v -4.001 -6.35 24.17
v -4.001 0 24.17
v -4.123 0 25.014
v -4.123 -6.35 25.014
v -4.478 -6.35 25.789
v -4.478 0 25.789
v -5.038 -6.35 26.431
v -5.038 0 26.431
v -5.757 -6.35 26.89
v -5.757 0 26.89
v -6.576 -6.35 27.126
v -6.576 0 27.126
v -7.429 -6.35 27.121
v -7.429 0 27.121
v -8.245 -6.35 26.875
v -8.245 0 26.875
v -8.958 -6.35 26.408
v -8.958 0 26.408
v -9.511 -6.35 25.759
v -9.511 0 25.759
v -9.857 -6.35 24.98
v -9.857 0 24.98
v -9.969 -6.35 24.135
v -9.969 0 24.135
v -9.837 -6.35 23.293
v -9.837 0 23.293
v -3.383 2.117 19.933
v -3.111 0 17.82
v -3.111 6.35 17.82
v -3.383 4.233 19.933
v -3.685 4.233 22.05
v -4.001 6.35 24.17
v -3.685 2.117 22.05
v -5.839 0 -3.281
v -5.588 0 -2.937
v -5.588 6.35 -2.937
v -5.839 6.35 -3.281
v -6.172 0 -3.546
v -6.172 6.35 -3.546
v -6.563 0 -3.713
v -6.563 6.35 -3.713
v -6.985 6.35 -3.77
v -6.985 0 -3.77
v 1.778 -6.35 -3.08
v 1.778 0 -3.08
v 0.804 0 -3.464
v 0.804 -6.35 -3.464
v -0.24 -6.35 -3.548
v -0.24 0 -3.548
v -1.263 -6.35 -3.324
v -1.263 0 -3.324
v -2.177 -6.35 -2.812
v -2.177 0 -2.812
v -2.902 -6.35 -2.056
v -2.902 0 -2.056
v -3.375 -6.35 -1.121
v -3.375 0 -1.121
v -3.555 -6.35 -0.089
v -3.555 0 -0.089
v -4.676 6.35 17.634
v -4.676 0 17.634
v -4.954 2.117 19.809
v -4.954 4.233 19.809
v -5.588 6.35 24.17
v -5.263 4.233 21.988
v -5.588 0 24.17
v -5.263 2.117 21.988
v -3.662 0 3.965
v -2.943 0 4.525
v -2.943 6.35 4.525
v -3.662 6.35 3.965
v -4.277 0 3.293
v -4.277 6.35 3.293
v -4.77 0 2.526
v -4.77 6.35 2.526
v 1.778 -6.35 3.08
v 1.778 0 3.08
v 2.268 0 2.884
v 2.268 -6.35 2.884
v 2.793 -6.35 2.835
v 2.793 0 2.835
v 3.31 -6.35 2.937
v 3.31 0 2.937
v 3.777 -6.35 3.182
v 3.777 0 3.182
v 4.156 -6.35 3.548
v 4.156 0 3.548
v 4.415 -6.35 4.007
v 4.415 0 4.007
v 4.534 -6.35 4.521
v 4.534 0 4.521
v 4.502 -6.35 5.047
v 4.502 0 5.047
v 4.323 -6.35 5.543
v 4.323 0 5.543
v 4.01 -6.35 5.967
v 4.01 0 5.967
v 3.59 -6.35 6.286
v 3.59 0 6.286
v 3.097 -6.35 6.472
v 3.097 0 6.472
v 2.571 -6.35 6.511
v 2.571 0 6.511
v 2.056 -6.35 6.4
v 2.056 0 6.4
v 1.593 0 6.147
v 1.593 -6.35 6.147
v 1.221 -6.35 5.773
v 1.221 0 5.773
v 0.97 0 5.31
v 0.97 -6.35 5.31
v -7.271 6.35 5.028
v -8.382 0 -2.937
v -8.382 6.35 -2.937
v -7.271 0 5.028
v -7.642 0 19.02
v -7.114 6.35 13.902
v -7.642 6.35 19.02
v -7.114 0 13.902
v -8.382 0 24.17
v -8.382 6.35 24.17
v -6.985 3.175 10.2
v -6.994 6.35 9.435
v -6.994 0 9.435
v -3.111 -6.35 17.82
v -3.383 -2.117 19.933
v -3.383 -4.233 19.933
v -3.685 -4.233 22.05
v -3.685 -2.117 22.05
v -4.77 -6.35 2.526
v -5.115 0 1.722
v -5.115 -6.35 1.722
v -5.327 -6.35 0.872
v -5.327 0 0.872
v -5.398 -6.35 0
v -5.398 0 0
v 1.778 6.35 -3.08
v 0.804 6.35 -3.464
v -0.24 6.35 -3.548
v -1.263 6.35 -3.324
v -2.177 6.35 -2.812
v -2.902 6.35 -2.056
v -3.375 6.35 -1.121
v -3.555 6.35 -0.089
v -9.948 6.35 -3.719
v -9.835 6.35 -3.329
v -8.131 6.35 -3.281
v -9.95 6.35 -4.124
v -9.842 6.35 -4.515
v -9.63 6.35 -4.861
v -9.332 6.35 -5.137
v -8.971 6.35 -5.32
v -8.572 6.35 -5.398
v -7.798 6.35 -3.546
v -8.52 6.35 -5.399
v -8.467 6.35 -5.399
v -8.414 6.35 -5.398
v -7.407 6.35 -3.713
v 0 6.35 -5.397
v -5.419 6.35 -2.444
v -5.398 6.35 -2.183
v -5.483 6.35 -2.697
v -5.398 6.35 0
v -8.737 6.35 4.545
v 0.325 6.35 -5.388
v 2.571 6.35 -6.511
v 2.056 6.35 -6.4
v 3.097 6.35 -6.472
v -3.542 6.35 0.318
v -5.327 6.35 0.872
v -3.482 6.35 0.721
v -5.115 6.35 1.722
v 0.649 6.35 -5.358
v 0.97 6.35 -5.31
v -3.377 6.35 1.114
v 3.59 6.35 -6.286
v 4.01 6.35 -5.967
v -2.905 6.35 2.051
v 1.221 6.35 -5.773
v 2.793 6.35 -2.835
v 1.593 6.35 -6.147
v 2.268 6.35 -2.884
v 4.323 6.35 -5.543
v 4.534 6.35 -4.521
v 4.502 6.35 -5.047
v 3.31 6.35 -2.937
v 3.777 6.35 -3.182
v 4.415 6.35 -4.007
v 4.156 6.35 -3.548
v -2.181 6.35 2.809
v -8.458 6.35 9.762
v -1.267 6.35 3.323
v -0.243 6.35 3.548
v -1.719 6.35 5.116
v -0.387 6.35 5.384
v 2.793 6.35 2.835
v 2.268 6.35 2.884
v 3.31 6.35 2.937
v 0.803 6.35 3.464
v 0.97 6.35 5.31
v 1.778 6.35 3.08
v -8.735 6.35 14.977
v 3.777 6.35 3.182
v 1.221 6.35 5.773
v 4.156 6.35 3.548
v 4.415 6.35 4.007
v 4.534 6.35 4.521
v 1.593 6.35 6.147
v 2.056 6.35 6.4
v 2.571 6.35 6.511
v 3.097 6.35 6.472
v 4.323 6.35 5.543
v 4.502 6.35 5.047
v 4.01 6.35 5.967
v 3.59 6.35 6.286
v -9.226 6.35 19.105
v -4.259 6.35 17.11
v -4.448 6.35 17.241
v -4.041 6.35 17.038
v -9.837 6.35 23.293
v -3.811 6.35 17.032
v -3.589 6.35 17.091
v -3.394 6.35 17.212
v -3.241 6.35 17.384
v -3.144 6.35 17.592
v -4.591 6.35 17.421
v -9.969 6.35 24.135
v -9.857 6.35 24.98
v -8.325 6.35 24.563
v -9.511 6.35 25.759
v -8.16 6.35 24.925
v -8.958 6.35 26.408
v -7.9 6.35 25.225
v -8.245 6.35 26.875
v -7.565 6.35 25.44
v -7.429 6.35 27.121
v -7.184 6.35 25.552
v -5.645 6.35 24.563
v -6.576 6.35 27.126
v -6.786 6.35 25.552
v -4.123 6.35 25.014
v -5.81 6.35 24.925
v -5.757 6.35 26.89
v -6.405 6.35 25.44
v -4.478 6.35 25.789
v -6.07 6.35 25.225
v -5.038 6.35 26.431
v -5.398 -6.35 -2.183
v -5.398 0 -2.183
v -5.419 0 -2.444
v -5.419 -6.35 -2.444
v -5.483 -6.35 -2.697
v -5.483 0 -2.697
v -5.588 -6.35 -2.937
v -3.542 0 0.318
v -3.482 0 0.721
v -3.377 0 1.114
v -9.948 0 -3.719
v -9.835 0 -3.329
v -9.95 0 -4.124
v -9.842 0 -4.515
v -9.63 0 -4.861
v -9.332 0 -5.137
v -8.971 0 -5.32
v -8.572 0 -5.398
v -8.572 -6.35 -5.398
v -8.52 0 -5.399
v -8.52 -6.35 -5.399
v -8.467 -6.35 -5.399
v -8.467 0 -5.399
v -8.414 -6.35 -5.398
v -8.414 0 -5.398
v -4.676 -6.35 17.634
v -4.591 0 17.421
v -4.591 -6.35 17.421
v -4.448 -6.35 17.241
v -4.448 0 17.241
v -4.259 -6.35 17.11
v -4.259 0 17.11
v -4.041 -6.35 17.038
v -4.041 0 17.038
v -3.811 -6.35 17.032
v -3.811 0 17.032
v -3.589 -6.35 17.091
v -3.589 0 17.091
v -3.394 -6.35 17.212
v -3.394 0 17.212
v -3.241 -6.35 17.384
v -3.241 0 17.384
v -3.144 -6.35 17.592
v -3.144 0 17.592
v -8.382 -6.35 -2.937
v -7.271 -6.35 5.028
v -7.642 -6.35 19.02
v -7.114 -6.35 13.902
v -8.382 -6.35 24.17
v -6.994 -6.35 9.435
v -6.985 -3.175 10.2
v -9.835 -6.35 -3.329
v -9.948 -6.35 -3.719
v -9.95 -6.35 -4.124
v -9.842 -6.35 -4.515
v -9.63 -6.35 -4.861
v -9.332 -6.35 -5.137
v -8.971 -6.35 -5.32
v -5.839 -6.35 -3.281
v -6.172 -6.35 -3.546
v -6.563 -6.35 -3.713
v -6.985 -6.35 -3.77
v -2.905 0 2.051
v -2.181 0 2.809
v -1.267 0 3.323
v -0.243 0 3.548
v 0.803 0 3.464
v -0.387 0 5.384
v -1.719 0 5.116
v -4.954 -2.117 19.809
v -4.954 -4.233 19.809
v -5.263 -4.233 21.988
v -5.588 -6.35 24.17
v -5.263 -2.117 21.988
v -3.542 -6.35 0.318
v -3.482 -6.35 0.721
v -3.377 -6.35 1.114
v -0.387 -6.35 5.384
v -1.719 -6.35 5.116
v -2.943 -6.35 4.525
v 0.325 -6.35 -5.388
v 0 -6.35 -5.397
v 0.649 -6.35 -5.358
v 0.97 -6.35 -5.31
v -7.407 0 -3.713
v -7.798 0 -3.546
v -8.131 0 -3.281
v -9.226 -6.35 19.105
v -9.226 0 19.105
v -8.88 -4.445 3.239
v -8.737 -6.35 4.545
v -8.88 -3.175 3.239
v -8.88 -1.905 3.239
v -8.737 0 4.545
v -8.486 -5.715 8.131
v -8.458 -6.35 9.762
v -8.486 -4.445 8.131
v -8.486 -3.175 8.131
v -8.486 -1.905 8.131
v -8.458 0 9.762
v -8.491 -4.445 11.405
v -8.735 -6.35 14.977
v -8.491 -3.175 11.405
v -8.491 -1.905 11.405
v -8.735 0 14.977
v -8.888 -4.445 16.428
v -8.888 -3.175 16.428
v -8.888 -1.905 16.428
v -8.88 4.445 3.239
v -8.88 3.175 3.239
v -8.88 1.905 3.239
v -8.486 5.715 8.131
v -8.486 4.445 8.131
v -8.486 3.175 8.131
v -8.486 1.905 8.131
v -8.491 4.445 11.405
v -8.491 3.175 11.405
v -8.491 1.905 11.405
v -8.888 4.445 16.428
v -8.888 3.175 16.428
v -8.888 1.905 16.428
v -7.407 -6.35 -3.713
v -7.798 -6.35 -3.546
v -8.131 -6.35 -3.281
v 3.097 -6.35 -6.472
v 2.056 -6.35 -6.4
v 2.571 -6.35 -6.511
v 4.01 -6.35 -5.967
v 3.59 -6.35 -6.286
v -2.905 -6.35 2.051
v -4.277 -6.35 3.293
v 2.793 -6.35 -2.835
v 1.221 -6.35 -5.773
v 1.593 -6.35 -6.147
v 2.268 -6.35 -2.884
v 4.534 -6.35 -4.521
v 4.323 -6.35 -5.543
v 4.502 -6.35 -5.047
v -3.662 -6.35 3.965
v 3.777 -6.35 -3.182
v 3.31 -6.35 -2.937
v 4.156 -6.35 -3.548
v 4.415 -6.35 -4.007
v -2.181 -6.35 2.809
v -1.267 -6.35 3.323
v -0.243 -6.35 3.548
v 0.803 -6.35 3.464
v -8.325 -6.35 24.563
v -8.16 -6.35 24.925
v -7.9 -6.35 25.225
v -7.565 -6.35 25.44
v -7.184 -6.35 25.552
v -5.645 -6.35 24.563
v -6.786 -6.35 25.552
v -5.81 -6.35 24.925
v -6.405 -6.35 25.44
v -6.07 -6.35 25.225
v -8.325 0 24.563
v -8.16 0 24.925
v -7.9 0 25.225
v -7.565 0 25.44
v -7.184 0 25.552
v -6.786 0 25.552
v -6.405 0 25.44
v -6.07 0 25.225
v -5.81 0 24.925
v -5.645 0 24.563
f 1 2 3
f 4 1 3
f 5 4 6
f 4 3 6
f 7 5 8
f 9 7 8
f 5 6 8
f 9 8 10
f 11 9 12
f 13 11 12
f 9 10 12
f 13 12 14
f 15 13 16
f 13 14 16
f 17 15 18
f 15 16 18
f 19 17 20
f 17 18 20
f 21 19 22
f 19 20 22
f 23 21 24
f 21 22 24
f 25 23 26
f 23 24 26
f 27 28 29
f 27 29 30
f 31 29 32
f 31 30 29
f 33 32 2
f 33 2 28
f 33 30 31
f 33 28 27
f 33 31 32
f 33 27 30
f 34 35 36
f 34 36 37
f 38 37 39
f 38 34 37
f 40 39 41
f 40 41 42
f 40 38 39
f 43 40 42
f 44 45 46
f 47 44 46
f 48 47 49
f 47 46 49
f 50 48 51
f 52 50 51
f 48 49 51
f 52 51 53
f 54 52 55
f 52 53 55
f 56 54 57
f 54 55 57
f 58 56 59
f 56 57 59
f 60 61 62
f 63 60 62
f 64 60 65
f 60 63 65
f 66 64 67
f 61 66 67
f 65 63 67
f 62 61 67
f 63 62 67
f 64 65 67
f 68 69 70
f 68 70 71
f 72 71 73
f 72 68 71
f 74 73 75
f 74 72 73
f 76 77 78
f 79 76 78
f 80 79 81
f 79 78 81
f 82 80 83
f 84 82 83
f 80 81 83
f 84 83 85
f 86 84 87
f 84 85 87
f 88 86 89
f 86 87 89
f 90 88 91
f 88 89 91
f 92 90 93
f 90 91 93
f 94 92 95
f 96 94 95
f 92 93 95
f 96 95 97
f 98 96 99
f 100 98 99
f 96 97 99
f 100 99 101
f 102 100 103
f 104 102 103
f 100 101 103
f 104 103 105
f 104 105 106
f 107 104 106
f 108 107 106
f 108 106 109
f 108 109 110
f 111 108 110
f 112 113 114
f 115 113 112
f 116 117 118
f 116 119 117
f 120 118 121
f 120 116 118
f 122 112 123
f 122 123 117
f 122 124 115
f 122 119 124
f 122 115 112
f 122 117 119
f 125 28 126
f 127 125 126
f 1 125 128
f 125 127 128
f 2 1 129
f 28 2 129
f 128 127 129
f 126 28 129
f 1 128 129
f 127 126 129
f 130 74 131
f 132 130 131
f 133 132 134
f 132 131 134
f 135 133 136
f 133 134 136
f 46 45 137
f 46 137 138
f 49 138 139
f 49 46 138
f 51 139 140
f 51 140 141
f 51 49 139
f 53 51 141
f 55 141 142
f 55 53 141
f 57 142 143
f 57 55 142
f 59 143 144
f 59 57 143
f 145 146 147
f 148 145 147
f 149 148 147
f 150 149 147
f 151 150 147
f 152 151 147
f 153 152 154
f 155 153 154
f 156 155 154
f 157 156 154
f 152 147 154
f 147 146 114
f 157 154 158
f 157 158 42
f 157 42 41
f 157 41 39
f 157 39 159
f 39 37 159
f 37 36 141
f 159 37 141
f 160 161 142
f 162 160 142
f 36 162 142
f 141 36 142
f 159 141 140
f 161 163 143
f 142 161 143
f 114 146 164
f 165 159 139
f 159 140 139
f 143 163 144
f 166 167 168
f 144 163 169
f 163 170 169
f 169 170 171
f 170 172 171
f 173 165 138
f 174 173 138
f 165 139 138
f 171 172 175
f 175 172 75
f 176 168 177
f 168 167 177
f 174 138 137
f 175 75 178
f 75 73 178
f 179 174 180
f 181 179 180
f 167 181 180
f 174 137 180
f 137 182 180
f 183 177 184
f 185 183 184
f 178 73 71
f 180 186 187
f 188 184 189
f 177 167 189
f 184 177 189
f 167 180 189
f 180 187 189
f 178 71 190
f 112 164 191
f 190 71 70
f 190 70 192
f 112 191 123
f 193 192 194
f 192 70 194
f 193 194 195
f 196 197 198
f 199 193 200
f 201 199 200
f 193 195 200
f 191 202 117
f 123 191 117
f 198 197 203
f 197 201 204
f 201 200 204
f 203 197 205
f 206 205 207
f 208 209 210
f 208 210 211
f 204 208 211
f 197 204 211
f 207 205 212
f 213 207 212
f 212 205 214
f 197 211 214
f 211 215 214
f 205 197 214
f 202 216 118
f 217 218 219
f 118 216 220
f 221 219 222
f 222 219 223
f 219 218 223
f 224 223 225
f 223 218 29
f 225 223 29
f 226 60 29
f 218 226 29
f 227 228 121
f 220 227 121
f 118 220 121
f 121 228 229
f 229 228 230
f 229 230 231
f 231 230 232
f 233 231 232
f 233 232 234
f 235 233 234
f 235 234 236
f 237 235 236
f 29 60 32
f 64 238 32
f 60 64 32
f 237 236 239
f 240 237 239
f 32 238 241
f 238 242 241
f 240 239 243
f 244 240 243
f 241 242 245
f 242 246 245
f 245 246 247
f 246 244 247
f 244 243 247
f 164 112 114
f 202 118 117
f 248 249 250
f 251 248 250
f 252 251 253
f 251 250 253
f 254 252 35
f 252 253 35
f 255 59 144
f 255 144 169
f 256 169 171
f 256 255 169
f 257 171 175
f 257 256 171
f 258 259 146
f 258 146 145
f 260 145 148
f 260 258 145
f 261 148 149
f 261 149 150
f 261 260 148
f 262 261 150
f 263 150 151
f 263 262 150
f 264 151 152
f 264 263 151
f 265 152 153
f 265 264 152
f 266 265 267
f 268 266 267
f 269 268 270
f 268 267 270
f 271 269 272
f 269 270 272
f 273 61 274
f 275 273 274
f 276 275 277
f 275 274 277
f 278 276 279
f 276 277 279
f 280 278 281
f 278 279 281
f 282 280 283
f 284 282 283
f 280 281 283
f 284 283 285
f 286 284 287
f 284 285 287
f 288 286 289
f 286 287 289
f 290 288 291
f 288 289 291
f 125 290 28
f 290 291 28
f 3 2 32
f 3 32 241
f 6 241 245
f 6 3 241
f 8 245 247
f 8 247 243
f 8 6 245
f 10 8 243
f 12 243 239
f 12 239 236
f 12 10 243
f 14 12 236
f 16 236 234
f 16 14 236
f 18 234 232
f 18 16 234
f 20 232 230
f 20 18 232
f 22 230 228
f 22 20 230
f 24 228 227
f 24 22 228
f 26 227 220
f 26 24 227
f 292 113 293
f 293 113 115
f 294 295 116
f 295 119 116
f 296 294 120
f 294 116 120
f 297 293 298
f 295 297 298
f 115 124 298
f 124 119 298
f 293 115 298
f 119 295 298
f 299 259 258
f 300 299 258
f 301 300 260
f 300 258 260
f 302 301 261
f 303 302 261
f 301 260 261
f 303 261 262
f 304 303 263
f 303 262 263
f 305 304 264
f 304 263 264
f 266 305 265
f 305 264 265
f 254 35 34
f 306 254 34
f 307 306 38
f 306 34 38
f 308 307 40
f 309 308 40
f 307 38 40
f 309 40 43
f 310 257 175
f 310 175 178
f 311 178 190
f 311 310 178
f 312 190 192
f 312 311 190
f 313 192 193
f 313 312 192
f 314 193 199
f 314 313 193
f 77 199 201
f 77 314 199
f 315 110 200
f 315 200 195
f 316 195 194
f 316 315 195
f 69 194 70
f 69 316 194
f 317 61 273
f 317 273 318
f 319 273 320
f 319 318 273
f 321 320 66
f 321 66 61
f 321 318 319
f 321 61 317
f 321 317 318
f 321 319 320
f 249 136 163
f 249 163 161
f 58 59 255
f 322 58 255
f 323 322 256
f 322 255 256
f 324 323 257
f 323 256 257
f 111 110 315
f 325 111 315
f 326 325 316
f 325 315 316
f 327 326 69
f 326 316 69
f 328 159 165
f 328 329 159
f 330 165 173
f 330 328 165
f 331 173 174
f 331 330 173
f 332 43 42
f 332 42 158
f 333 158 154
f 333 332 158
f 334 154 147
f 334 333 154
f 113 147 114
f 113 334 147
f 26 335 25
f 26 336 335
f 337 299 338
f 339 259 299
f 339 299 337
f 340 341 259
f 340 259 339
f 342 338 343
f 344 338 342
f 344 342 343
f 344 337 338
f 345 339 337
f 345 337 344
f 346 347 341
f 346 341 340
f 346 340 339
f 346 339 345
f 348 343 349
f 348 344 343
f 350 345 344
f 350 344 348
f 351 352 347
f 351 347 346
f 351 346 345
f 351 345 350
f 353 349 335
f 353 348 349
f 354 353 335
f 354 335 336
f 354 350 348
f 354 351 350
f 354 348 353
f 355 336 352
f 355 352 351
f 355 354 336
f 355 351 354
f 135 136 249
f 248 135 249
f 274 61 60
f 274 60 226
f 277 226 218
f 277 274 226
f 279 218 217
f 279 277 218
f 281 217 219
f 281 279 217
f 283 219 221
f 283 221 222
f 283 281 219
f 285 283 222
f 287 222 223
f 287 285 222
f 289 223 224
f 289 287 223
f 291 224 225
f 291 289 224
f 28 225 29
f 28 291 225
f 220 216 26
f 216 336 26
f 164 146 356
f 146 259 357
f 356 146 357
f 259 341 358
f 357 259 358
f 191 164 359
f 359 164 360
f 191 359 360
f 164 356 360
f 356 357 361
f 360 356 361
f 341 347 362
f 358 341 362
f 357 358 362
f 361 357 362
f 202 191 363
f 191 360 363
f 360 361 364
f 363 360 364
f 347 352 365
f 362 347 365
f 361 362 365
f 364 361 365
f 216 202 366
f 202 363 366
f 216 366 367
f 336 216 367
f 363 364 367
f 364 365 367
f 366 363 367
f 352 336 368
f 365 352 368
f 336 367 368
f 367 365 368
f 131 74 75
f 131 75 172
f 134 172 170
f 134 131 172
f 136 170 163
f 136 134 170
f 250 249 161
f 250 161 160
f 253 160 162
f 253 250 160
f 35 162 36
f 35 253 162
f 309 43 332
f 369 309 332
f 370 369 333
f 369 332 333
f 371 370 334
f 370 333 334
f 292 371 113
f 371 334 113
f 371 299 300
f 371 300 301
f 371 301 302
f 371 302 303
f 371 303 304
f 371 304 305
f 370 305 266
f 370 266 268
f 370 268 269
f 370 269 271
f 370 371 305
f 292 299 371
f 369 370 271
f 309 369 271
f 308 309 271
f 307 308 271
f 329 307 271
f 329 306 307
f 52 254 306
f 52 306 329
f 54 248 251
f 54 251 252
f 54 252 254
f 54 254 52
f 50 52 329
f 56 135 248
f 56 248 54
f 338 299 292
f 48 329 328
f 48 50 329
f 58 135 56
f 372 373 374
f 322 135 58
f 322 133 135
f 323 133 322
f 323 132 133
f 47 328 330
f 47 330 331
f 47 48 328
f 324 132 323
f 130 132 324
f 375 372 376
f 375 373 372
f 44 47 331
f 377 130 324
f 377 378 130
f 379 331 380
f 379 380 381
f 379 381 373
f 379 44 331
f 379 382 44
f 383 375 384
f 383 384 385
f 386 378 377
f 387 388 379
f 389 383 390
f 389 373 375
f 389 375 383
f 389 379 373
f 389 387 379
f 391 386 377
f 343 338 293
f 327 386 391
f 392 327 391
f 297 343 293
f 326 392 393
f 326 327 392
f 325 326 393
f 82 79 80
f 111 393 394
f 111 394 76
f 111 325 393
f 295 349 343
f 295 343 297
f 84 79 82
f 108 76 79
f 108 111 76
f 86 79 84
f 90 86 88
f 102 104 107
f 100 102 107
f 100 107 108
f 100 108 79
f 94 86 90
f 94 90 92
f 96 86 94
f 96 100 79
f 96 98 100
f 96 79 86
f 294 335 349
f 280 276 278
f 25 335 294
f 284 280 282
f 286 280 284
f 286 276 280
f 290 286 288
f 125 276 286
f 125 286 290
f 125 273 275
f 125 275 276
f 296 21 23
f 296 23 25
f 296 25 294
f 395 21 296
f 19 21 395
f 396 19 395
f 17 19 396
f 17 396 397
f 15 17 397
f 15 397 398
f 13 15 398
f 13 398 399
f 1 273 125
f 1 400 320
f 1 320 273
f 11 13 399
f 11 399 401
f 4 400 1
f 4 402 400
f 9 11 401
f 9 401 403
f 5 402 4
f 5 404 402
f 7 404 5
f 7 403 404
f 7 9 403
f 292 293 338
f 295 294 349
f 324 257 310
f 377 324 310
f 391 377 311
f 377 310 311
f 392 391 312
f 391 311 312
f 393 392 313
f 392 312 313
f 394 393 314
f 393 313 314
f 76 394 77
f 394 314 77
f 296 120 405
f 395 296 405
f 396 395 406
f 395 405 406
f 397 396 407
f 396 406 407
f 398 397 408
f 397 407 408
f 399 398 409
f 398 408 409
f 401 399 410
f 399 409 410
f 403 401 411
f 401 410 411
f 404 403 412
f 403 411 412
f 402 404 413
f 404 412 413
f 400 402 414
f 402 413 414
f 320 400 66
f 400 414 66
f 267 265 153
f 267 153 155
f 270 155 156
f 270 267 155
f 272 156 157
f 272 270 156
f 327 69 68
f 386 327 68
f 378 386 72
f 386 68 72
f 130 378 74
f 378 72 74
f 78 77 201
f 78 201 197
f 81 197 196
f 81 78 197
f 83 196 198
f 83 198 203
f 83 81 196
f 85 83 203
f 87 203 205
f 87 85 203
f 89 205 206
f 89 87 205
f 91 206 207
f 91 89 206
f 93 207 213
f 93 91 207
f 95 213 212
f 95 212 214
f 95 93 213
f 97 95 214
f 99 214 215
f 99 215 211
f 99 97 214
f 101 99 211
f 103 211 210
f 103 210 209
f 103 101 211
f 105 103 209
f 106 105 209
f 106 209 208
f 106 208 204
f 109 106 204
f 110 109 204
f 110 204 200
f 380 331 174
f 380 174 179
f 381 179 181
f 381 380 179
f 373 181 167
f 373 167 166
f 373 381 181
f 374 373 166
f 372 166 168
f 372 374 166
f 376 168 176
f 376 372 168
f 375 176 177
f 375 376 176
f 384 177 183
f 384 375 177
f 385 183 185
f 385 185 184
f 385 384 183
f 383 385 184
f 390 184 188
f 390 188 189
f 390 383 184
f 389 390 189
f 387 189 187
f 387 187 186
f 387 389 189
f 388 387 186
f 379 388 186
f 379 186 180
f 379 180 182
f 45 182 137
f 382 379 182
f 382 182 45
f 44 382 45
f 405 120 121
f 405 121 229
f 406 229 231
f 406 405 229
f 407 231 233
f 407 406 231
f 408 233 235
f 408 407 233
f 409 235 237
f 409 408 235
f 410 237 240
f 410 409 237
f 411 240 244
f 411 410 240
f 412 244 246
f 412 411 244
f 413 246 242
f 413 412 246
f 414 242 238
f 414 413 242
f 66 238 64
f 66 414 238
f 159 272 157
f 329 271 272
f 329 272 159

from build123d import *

# Parameters (mm, degrees)
F1_DEPTH = 6.35


# Not quite as in the source:
# - ends of sketch curves that miss each other by under 0.0002 mm in the source are joined
# - the dataset's text gives a spline's control points without its knots; the knots are read off the source's solid


with BuildPart() as f1:
    # F0 (on Front) → F1 (new body, symmetric)
    with BuildSketch(Plane.XZ):
        with BuildLine():
            Line((-8.4141566916, -5.3975), (0, -5.3975))
            ThreePointArc((0, -5.3975), (0.4871232852, -5.375473668), (0.9702708263, -5.3095744437))
            ThreePointArc((0.9702708263, -5.3095744437), (4.4301700946, -5.3015138122), (1.778, -3.0795863359))
            ThreePointArc((1.778, -3.0795863359), (-1.7391660801, -3.101682986), (-3.5548772461, -0.0893519188))
            ThreePointArc((-3.5548772461, -0.0893519188), (-3.5177568499, 0.5201180106), (-3.3769182629, 1.1142526848))
            add(Edge.make_bspline(
                [(-3.3769182629, 1.1142526848), (-3.213886893, 2.2483634663), (-3.0651248799, 3.384623456), (-2.942596945, 4.524834745)],
                knots=[0.1529319216, 0.1529319216, 0.1529319216, 0.1529319216, 0.2811638974, 0.2811638974, 0.2811638974, 0.2811638974], degree=3))
            ThreePointArc((-2.942596945, 4.524834745), (-3.9835985246, 3.6419704892), (-4.7698383359, 2.5261924906))
            add(Edge.make_bspline(
                [(-5.3975, -1.7347033349), (-5.173779235, -0.3165887052), (-4.9567128934, 1.1025281941), (-4.7698383359, 2.5261924906)],
                knots=[0.0454256059, 0.0454256059, 0.0454256059, 0.0454256059, 0.2061005135, 0.2061005135, 0.2061005135, 0.2061005135], degree=3))
            Line((-5.3975, -1.7347033349), (-5.3975, -2.1827106738))
            ThreePointArc((-5.3975, -2.1827106738), (-5.4459433862, -2.5718905674), (-5.5883169948, -2.9373184082))
            ThreePointArc((-5.5883169948, -2.9373184082), (-6.1719143737, -3.5461797839), (-6.985, -3.7702106738))
            ThreePointArc((-6.985, -3.7702106738), (-7.7980896495, -3.5461803993), (-8.3816869181, -2.9373205224))
            add(Edge.make_bspline(
                [(-8.3816869181, -2.9373205224), (-7.6903162591, 1.4077055077), (-6.2862259108, 10.2319288559), (-7.676155344, 19.4769791983), (-8.3816869181, 24.1697893262)],
                knots=[0, 0, 0, 0, 0.4923975582, 1, 1, 1, 1], degree=3))
            ThreePointArc((-8.3816869181, 24.1697893262), (-6.985, 25.5664762444), (-5.5883130819, 24.1697893263))
            add(Edge.make_bspline(
                [(-4.676452861, 17.6339959576), (-4.9321460197, 19.8053249313), (-5.2602295508, 21.9875571288), (-5.5883130819, 24.1697893263)],
                knots=[0.7639566994, 0.7639566994, 0.7639566994, 0.7639566994, 1, 1, 1, 1], degree=3))
            ThreePointArc((-4.676452861, 17.6339959576), (-3.8112048513, 17.0315712658), (-3.1110035111, 17.8197893262))
            add(Edge.make_bspline(
                [(-3.1110035111, 17.8197893262), (-3.3633587069, 19.9297914909), (-3.6820858944, 22.0497904085), (-4.0008130819, 24.1697893262)],
                knots=[0.7706882235, 0.7706882235, 0.7706882235, 0.7706882235, 1, 1, 1, 1], degree=3))
            ThreePointArc((-4.0008130819, 24.1697893262), (-7.4285431353, 27.1208299985), (-9.837338265, 23.292556185))
            add(Edge.make_bspline(
                [(-9.8352581181, -3.3290753137), (-9.6597468246, -2.2260473952), (-9.3104483349, -0.0304942675), (-8.8571977057, 3.2414000554), (-8.5914867755, 5.9577245973), (-8.4768185316, 8.1311720824), (-8.4476359431, 9.7599621423), (-8.4814070197, 11.4021639111), (-8.5995564813, 13.6155987531), (-8.8666228021, 16.4200169888), (-9.3175498954, 19.8349473194), (-9.6635970859, 22.1369248922), (-9.837338265, 23.292556185)],
                knots=[0, 0, 0, 0, 0.125, 0.25, 0.375, 0.4375, 0.5, 0.5625, 0.625, 0.75, 0.875, 1, 1, 1, 1], degree=3))
            ThreePointArc((-9.8352581181, -3.3290753137), (-9.7481101941, -4.6955367779), (-8.5725, -5.3975))
            Line((-8.5725, -5.3975), (-8.4141566916, -5.3975))
        make_face()
        with BuildLine():
            ThreePointArc((-8.5725, -5.3975), (-8.4933283458, -5.399633381), (-8.4141566916, -5.3975))
            Line((-8.4141566916, -5.3975), (-8.5725, -5.3975))
        make_face()
        with BuildLine():
            add(Edge.make_bspline(
                [(-3.3769182629, 1.1142526848), (-3.213886893, 2.2483634663), (-3.0651248799, 3.384623456), (-2.942596945, 4.524834745)],
                knots=[0.1529319216, 0.1529319216, 0.1529319216, 0.1529319216, 0.2811638974, 0.2811638974, 0.2811638974, 0.2811638974], degree=3))
            ThreePointArc((-3.3769182629, 1.1142526848), (-1.2667947714, 3.3227047728), (1.778, 3.0795863359))
            ThreePointArc((1.778, 3.0795863359), (4.4301700946, 5.3015138122), (0.9702708263, 5.3095744437))
            ThreePointArc((0.9702708263, 5.3095744437), (-1.0613537009, 5.2921200451), (-2.942596945, 4.524834745))
        make_face()
        with BuildLine():
            add(Edge.make_bspline(
                [(-5.3975, -1.7347033349), (-5.173779235, -0.3165887052), (-4.9567128934, 1.1025281941), (-4.7698383359, 2.5261924906)],
                knots=[0.0454256059, 0.0454256059, 0.0454256059, 0.0454256059, 0.2061005135, 0.2061005135, 0.2061005135, 0.2061005135], degree=3))
            ThreePointArc((-4.7698383359, 2.5261924906), (-5.2382348491, 1.3014998717), (-5.3975, 0))
            Line((-5.3975, 0), (-5.3975, -1.7347033349))
        make_face()
    extrude(amount=F1_DEPTH, both=True)


solid = f1.part
